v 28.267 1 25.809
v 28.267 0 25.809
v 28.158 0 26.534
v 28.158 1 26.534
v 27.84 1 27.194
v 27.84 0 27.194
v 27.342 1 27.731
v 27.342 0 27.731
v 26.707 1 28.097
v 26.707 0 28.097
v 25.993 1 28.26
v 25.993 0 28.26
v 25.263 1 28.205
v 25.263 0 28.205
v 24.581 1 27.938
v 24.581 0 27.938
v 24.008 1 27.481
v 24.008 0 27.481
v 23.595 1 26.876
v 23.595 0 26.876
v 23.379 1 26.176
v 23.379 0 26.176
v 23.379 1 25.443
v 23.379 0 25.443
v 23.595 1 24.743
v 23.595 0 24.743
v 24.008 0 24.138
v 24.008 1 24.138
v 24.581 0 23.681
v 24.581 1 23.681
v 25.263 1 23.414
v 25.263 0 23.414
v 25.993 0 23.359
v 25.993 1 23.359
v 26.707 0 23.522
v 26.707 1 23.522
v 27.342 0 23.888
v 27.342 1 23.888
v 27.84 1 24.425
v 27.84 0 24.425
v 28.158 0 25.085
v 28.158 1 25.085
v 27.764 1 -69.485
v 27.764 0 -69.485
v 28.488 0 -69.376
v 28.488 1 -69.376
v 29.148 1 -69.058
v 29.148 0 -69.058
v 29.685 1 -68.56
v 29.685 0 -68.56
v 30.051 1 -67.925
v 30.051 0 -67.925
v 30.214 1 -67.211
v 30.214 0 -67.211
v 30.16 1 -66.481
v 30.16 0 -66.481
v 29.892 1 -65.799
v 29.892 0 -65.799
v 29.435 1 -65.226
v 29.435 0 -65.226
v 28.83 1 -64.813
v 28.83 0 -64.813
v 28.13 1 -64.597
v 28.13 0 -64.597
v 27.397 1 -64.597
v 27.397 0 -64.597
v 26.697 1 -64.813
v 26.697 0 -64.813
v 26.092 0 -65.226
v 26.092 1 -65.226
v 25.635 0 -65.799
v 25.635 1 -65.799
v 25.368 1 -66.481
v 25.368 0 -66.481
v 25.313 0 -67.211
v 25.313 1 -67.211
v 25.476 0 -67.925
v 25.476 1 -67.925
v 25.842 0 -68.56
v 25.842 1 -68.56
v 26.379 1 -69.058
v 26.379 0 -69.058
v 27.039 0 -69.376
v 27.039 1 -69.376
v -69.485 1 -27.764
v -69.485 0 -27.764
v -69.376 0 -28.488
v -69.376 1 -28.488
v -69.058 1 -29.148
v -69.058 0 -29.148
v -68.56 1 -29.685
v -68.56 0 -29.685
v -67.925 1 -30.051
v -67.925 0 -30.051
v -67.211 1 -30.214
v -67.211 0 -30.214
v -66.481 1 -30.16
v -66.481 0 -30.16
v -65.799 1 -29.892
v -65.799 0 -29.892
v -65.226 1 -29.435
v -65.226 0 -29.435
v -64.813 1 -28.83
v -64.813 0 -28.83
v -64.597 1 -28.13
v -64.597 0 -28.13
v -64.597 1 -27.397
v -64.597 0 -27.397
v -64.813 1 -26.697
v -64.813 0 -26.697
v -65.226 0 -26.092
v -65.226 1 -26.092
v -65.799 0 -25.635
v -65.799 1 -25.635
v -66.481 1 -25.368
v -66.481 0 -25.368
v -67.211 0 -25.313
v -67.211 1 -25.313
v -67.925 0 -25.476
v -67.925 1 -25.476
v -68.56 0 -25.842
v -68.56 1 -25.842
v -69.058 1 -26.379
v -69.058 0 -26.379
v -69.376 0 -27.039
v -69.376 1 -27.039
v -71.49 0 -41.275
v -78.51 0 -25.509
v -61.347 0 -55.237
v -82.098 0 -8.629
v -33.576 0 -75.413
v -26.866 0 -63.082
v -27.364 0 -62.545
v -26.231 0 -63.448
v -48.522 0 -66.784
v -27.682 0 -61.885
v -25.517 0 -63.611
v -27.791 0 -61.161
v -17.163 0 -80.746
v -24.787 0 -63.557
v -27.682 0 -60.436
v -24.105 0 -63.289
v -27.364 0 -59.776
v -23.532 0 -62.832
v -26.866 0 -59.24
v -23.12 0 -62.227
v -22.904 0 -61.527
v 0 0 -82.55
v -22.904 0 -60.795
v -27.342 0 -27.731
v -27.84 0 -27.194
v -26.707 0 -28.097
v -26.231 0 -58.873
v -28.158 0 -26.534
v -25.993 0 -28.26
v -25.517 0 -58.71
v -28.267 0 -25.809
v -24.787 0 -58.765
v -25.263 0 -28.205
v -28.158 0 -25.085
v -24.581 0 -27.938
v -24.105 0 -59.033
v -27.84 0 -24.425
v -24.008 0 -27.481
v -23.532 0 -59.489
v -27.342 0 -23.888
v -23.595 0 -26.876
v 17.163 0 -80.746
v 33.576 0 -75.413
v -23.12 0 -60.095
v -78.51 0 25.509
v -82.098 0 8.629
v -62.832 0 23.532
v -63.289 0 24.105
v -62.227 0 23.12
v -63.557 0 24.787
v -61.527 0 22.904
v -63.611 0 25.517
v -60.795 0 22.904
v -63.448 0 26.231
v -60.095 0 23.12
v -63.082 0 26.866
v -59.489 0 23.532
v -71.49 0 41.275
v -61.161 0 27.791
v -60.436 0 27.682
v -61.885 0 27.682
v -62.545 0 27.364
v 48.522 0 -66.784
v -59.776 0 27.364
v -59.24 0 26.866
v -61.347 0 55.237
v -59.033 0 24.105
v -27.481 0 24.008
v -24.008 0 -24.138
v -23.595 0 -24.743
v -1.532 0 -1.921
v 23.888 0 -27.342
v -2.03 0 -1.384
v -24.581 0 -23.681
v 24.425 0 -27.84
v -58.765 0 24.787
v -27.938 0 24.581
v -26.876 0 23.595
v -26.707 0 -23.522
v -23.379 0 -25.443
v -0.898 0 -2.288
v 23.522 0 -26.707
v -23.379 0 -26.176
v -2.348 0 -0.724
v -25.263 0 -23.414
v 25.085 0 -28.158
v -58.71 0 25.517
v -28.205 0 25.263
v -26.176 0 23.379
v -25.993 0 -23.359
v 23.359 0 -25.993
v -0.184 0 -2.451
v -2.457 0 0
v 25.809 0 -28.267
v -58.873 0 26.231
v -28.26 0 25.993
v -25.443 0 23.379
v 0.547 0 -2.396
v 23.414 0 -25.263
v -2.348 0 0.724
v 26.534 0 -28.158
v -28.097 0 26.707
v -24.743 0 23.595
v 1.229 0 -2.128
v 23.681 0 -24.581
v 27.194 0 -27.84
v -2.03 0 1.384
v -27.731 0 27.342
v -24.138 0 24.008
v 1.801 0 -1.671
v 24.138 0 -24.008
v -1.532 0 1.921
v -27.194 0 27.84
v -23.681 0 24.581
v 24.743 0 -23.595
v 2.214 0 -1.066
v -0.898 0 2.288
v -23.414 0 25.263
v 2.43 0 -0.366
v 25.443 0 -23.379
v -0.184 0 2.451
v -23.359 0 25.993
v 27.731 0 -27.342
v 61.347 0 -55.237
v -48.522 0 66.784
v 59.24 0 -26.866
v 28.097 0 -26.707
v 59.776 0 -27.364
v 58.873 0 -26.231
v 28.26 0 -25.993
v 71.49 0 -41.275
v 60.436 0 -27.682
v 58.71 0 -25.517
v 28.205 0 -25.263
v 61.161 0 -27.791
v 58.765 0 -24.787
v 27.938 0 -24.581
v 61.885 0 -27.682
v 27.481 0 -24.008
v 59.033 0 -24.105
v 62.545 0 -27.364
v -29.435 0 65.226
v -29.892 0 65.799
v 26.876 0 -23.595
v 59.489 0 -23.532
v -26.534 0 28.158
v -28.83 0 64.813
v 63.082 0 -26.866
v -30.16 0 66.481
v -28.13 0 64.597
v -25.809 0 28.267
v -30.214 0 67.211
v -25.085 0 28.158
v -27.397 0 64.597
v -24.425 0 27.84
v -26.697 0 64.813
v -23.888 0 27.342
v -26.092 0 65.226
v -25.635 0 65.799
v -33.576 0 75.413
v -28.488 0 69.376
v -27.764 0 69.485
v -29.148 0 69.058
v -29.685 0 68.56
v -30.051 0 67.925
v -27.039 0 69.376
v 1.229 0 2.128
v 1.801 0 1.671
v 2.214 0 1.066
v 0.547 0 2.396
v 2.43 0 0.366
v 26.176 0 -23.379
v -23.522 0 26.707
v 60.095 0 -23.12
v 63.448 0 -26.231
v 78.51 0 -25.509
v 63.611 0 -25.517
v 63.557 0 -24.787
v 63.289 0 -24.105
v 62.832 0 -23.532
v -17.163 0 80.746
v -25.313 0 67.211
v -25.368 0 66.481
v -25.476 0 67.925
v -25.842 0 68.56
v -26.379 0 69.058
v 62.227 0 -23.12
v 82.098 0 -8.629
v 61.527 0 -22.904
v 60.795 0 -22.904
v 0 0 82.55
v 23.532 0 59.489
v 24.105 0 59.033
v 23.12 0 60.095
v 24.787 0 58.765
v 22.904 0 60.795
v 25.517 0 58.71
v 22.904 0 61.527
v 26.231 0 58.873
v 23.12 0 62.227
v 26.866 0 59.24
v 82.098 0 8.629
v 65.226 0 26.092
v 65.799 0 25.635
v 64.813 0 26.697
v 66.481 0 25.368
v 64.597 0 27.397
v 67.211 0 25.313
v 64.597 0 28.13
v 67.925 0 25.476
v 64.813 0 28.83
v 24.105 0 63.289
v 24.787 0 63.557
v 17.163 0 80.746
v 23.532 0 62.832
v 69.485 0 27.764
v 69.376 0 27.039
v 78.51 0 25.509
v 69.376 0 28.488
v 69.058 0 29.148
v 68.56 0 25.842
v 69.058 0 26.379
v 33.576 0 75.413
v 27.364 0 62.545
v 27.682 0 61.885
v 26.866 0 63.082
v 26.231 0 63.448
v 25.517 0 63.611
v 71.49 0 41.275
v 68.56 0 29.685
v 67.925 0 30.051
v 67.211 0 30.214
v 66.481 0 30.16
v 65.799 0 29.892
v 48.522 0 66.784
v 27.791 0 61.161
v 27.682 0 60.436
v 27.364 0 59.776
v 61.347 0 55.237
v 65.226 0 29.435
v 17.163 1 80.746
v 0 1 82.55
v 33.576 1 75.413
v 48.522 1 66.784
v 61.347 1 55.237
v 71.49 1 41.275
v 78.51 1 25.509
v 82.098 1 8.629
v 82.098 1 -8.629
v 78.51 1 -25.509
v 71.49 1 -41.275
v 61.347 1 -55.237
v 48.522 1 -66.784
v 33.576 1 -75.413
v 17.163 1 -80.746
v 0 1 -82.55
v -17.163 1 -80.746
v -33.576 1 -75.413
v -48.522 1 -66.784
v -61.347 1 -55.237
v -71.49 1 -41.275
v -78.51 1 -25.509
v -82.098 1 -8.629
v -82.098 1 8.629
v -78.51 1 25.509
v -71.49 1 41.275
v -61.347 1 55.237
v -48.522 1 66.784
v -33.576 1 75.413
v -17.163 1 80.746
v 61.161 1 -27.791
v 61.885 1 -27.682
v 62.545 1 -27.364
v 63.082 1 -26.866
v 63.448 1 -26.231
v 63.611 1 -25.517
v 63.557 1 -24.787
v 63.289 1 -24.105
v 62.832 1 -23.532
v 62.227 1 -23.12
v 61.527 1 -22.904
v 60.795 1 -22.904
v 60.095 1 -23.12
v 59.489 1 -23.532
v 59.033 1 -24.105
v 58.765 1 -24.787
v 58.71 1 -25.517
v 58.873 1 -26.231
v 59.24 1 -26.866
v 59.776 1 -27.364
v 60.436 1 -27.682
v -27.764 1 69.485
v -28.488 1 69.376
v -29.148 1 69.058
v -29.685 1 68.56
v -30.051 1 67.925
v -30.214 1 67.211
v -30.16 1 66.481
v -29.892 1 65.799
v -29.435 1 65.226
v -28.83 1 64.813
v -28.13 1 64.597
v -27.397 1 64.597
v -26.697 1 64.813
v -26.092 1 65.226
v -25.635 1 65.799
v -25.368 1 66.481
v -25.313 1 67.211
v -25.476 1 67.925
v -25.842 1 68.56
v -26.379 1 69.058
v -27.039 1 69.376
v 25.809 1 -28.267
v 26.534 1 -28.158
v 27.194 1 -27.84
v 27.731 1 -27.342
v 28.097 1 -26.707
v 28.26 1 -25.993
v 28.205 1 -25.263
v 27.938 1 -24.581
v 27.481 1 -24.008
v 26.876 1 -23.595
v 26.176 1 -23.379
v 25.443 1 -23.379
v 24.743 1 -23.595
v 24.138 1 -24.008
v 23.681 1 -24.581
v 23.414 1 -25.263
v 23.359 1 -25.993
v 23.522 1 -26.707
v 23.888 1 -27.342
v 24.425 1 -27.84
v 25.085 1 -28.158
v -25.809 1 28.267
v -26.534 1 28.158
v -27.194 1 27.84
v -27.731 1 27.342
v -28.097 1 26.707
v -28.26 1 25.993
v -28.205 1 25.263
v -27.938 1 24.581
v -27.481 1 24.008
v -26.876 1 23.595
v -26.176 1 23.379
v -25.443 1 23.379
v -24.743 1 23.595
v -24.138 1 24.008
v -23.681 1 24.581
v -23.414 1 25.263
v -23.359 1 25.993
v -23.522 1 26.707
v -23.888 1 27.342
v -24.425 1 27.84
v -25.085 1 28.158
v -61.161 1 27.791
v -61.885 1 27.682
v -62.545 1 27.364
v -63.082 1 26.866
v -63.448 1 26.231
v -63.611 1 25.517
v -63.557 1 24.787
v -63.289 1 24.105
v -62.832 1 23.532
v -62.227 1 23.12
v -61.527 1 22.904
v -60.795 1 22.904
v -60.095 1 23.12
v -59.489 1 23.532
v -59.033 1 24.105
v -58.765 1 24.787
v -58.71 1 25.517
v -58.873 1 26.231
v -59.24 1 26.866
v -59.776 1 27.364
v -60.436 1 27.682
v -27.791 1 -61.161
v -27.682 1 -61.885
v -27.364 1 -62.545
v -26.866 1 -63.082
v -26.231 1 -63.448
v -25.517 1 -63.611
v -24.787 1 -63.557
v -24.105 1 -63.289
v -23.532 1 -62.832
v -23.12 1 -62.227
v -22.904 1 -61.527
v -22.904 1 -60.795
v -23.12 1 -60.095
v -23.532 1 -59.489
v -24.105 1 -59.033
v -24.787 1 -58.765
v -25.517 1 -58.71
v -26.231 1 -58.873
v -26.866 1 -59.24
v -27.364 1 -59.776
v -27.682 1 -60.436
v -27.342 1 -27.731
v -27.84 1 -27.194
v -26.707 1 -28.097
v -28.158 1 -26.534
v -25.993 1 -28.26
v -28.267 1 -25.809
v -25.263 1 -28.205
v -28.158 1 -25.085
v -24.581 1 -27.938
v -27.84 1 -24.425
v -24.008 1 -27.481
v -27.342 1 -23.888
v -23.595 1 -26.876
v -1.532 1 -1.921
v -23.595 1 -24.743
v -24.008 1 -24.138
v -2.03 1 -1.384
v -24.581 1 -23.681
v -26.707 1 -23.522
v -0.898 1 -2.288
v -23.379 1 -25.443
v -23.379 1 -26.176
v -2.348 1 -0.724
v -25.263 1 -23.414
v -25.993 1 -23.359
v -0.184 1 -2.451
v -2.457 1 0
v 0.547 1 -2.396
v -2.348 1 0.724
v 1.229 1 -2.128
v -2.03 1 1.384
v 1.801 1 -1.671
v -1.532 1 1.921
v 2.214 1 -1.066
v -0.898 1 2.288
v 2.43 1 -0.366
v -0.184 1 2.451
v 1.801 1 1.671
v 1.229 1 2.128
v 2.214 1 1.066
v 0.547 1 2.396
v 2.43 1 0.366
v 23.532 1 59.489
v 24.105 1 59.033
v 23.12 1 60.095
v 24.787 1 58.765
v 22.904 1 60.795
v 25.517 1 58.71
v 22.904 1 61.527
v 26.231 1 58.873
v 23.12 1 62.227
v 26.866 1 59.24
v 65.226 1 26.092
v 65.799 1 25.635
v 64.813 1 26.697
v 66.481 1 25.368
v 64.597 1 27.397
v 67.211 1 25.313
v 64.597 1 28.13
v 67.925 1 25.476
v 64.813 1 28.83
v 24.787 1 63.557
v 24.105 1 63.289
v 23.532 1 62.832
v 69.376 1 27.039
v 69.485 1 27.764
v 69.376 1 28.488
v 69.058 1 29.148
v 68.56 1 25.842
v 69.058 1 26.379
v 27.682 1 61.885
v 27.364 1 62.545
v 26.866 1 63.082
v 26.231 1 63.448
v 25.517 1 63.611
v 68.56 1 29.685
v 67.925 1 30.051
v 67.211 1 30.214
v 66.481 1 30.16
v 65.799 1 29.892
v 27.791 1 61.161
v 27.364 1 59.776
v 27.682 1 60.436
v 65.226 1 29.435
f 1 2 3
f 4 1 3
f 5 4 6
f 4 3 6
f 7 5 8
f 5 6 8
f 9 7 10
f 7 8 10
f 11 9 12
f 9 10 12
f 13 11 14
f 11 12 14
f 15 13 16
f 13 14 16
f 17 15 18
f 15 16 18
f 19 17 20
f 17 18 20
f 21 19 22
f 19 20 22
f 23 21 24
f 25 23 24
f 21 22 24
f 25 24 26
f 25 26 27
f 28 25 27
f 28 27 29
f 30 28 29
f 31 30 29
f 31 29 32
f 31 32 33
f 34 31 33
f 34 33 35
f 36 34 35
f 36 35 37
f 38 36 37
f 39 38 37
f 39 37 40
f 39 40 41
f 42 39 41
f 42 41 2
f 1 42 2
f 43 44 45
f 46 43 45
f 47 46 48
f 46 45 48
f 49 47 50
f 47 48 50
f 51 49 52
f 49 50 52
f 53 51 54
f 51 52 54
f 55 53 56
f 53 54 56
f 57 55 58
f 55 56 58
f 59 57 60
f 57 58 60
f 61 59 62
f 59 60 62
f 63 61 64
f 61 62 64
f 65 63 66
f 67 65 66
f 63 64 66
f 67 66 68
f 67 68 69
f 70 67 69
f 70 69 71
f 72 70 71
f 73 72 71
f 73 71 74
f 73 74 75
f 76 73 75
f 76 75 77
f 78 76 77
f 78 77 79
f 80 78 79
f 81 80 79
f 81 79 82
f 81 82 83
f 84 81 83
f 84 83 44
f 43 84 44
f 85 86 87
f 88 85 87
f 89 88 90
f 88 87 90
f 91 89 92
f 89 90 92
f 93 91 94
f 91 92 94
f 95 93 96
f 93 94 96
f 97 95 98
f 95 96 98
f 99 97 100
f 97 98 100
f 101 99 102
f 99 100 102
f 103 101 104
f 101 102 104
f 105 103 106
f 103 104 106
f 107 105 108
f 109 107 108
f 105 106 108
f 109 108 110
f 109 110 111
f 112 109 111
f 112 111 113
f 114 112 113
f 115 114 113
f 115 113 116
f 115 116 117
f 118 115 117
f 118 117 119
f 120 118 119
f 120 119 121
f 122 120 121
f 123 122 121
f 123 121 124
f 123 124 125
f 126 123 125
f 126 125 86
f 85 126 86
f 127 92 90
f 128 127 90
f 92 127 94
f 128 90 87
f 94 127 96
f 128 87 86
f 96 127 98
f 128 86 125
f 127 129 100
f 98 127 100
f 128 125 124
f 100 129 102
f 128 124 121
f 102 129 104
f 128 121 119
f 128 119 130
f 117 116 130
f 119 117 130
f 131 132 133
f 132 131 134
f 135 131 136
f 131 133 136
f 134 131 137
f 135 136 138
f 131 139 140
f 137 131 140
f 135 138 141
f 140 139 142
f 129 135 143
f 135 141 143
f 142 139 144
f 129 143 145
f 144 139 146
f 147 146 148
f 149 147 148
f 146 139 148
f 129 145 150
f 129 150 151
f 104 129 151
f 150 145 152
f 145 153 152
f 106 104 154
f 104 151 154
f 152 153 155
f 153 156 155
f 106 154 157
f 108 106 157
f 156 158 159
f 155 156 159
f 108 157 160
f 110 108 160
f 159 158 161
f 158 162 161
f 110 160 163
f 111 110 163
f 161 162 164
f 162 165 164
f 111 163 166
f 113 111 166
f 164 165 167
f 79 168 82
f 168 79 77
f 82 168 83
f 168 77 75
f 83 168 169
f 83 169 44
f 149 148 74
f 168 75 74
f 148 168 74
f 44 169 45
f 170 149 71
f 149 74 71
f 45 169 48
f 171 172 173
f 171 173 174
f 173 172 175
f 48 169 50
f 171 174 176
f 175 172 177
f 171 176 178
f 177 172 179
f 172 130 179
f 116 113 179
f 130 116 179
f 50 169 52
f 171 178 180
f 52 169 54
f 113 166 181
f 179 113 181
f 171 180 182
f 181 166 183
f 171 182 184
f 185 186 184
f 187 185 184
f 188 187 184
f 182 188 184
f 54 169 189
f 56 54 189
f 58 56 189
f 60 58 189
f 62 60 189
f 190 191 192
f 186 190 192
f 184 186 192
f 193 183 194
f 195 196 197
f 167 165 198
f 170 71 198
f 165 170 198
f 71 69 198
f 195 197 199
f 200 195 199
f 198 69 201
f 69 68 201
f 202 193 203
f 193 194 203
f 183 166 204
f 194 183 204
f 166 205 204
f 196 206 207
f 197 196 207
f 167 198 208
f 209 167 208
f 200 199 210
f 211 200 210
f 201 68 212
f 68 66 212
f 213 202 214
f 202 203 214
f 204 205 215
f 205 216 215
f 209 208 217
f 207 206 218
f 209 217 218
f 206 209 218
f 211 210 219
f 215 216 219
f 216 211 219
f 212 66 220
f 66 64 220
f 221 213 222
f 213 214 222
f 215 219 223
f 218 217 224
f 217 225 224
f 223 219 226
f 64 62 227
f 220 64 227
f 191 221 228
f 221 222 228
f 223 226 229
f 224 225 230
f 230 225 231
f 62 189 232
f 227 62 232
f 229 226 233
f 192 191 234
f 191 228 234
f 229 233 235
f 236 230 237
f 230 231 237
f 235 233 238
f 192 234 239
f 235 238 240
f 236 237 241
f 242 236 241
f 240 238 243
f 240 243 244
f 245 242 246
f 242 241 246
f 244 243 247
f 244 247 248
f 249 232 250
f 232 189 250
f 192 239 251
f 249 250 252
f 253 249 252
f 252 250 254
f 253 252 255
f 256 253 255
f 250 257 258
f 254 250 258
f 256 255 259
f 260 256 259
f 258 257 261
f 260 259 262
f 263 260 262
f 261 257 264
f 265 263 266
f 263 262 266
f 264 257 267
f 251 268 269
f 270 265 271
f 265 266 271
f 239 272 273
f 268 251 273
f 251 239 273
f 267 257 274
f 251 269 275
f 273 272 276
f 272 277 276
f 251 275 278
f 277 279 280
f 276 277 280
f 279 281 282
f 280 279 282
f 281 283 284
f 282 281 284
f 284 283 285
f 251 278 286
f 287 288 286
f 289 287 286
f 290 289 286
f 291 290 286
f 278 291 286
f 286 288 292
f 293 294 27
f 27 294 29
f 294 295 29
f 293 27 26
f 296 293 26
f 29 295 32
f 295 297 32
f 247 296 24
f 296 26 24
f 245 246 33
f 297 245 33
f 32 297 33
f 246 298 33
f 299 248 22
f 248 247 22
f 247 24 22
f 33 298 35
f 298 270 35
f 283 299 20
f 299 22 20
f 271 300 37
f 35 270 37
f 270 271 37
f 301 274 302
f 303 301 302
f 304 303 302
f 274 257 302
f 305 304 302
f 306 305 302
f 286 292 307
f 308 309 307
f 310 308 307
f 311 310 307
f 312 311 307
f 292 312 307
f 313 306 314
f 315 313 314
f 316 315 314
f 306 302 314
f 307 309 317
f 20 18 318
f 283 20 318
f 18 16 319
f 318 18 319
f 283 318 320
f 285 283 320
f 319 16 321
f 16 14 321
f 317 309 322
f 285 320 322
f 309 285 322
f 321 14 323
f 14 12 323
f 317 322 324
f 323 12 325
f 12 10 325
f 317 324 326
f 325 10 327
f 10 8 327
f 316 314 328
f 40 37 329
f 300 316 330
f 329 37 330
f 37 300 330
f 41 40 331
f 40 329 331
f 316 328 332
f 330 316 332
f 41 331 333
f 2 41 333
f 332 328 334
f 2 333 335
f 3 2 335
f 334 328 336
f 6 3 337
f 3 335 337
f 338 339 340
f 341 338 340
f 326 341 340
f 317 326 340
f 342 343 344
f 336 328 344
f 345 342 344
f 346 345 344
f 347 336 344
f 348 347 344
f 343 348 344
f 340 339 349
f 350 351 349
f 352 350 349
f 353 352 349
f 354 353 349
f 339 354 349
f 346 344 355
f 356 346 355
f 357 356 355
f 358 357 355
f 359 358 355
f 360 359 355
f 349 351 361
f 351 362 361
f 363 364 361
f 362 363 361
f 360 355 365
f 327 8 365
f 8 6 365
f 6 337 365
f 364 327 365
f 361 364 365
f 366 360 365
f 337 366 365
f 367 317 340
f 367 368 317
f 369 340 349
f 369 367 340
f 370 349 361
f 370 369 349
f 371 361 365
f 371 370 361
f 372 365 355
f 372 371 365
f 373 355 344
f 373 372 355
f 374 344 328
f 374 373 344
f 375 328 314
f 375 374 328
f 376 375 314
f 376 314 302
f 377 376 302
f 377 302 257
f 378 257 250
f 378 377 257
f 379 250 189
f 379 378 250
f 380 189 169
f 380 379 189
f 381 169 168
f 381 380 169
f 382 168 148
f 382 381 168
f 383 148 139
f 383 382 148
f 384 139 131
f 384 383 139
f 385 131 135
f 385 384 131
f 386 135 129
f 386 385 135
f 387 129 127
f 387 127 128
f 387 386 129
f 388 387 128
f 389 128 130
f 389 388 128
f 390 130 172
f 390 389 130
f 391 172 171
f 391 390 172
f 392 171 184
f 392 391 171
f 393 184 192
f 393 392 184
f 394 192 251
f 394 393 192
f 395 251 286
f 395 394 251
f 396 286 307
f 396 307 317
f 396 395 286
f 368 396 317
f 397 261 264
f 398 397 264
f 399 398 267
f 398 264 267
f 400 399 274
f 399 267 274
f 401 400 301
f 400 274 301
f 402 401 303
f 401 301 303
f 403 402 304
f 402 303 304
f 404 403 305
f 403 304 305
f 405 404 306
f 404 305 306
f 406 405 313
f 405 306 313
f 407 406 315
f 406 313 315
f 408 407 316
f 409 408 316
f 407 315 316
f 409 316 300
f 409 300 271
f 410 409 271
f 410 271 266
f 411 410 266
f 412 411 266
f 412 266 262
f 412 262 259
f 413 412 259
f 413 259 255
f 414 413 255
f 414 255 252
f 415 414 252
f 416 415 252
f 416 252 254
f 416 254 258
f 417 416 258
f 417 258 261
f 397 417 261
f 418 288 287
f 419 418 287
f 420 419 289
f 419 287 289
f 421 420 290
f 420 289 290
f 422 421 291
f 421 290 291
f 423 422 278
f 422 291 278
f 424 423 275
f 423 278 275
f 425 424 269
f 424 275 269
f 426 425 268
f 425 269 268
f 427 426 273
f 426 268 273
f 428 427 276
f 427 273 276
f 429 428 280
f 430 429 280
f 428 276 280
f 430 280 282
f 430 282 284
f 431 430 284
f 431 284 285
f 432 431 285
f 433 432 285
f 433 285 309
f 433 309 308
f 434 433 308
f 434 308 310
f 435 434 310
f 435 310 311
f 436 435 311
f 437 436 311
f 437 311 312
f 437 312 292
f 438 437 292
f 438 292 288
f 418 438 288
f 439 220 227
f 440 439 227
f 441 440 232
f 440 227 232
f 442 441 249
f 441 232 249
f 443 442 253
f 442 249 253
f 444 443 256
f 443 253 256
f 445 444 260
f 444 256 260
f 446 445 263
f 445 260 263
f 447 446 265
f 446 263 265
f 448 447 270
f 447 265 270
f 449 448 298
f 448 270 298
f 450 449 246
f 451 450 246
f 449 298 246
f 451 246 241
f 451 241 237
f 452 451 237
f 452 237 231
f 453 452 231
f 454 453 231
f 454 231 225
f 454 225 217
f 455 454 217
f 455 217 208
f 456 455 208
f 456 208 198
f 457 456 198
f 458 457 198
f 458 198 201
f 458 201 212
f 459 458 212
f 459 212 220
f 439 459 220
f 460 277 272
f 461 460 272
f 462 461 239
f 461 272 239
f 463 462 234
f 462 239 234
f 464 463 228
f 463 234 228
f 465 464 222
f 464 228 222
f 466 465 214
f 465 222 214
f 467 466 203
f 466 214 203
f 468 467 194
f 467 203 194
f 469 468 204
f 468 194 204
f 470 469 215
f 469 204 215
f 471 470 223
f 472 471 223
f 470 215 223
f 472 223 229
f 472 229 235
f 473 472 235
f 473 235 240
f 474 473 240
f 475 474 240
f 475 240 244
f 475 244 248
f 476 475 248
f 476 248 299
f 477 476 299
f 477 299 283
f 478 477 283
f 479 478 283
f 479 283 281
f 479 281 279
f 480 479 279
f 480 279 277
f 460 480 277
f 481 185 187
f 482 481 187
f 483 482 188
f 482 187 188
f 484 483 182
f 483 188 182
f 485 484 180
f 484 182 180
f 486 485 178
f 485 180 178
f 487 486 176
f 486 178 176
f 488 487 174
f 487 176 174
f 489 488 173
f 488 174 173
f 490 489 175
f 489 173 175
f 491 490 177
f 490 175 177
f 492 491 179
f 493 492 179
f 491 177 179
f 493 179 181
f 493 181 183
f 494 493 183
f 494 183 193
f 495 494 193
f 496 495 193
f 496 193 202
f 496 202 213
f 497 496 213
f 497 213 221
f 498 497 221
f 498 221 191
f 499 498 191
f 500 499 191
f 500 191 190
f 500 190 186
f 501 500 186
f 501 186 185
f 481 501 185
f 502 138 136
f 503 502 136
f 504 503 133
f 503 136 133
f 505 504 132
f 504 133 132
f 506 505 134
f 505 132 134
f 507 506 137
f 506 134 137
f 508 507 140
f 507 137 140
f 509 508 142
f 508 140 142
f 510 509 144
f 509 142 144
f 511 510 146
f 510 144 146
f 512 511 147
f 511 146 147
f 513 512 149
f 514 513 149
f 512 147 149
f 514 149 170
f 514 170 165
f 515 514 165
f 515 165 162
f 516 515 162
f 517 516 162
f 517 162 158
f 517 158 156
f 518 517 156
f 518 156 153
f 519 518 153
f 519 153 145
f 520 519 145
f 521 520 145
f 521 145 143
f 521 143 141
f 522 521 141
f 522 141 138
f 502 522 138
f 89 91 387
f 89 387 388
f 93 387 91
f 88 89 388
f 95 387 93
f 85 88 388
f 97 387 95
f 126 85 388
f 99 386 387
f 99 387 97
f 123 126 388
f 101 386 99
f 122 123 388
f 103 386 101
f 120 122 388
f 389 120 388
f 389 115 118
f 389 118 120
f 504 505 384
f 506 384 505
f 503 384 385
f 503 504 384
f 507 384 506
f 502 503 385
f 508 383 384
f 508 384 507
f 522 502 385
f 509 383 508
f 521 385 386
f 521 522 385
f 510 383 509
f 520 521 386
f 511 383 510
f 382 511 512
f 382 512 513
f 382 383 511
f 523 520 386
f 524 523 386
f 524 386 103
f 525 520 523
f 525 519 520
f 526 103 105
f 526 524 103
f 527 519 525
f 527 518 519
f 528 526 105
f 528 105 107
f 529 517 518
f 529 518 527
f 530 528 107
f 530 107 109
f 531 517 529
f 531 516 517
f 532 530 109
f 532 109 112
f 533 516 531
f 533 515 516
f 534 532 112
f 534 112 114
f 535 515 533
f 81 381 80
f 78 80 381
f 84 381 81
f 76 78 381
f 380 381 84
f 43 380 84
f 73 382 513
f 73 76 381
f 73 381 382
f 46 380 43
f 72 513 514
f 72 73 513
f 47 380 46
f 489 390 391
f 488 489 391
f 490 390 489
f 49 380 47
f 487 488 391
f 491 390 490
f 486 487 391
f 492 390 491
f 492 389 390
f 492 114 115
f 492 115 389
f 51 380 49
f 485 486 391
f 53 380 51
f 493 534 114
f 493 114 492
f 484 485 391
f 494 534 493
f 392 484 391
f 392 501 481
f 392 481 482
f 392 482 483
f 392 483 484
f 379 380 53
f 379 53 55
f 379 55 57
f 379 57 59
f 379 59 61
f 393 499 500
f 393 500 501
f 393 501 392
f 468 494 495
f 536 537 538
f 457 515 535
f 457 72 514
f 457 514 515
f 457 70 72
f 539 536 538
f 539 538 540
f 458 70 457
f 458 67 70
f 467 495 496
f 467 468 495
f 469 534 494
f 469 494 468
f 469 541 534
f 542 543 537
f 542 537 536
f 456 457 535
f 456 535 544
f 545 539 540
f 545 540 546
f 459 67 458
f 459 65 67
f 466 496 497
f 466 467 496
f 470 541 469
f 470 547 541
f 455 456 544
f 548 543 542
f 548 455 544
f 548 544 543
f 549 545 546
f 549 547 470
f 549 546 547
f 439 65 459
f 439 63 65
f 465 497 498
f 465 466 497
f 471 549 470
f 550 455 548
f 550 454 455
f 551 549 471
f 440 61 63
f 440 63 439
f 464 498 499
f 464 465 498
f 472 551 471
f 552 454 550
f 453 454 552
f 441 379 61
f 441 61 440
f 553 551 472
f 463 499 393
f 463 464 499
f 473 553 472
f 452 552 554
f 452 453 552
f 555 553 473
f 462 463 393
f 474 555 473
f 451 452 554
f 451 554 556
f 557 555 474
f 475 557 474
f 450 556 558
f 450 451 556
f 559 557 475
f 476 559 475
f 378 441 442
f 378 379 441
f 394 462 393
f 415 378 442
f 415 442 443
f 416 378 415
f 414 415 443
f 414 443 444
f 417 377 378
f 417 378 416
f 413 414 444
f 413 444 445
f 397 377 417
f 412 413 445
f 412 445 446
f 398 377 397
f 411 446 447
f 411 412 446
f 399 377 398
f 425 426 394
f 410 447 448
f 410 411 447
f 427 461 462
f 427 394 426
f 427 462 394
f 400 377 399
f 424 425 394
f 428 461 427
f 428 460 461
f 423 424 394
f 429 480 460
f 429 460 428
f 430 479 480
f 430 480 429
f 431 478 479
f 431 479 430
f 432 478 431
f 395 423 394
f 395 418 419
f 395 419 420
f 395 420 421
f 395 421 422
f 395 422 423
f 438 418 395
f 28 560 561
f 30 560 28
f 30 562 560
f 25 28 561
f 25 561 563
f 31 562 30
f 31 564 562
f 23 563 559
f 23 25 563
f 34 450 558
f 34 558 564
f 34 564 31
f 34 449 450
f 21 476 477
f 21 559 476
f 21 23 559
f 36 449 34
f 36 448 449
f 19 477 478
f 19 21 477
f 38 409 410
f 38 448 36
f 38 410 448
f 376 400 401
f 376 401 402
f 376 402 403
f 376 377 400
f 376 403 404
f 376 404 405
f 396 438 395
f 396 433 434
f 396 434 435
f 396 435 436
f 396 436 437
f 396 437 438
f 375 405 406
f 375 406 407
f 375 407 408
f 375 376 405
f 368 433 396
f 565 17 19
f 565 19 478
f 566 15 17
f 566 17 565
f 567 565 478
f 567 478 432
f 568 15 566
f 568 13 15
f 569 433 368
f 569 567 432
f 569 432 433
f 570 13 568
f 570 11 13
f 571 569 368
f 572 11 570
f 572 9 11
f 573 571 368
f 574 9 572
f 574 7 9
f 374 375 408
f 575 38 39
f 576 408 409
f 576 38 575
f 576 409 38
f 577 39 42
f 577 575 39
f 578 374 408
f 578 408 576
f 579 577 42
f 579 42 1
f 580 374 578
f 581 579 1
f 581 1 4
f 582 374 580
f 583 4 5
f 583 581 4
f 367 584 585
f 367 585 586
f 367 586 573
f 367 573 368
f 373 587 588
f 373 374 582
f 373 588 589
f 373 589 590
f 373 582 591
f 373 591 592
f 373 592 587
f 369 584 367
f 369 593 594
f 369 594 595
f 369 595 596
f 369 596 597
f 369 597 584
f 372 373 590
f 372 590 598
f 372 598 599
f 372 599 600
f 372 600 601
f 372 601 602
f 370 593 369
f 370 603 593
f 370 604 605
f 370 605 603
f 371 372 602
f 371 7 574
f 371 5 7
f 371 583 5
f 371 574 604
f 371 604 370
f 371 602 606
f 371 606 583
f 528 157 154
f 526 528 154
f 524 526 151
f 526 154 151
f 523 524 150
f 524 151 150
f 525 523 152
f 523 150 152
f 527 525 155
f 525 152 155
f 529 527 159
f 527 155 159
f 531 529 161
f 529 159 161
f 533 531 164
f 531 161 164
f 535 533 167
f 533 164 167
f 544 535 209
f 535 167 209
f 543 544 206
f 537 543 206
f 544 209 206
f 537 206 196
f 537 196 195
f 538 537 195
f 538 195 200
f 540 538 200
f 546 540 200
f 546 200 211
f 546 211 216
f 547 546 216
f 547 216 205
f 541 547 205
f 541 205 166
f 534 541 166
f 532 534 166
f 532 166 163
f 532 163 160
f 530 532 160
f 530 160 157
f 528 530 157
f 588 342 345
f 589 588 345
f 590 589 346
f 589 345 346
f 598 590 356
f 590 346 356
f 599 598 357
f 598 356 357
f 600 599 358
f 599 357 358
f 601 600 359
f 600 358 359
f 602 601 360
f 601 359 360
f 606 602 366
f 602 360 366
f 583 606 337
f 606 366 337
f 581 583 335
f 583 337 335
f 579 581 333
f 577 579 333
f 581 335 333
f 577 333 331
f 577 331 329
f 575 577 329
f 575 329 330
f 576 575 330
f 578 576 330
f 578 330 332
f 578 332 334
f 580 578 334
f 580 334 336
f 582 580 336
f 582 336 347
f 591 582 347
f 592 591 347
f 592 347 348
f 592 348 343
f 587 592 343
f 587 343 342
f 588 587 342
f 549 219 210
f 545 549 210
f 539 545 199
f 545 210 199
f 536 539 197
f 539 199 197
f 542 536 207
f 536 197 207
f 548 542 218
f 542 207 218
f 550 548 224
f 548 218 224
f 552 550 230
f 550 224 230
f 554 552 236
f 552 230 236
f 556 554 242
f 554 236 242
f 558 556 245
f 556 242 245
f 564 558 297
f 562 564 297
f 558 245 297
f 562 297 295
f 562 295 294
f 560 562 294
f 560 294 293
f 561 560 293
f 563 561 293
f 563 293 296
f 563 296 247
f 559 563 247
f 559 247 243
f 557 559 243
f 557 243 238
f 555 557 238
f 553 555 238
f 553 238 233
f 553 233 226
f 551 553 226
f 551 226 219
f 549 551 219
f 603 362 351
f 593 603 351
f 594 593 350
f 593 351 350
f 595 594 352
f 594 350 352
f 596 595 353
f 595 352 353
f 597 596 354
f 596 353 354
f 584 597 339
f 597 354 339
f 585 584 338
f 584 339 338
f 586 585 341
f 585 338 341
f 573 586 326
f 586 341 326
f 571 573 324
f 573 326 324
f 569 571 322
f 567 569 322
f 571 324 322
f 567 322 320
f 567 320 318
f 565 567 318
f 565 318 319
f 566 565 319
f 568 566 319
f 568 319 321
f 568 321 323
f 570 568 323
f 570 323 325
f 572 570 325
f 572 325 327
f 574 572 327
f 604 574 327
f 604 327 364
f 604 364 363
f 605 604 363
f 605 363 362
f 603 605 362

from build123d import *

# Parameters (mm, degrees)
SKETCH2_W                    = 82.55
SKETCH2_H                    = 1
F_10_0_1935_DIAMETER_HOLE1_D = 4.9149
CIRPATTERN3_COUNT            = 4
F_10_0_1935_DIAMETER_HOLE2_D = 4.9149


with BuildPart() as part:
    # Sketch2 → Revolve1 (revolve)
    with BuildSketch(Plane(origin=(0, 0, 0), x_dir=(0, 0, -1), z_dir=(1, 0, 0))):
        with Locations((-41.275, 0.5)):
            Rectangle(SKETCH2_W, SKETCH2_H)
    revolve(axis=Axis((0, -0.05, 0), (0, 1, 0)))

    # #10 (0.1935) Diameter Hole1 (through all)
    with Locations(Plane(origin=(0, 1, 0), x_dir=(1, 0, 0), z_dir=(0, 1, 0))):
        with Locations((-25.333643223, 61.160825052), (264.743675233, 73.787758551), (-67.027460084, 27.763683018), (-25.809397513, 25.809397513)):
            f_10_0_1935_diameter_hole1 = Hole(F_10_0_1935_DIAMETER_HOLE1_D / 2)

    # CirPattern3: #10 (0.1935) Diameter Hole1 ×4 about axis
    cirpattern3_axis = Axis((0, 0, 0), (0, 1, 0))
    for i in range(1, CIRPATTERN3_COUNT):
        add(f_10_0_1935_diameter_hole1.rotate(cirpattern3_axis, i * 360 / CIRPATTERN3_COUNT), mode=Mode.SUBTRACT)

    # #10 (0.1935) Diameter Hole2 (through all)
    with Locations(Plane(origin=(0, 1, 0), x_dir=(1, 0, 0), z_dir=(0, 1, 0))):
        with Locations((0, 0)):
            Hole(F_10_0_1935_DIAMETER_HOLE2_D / 2)


solid = part.part
